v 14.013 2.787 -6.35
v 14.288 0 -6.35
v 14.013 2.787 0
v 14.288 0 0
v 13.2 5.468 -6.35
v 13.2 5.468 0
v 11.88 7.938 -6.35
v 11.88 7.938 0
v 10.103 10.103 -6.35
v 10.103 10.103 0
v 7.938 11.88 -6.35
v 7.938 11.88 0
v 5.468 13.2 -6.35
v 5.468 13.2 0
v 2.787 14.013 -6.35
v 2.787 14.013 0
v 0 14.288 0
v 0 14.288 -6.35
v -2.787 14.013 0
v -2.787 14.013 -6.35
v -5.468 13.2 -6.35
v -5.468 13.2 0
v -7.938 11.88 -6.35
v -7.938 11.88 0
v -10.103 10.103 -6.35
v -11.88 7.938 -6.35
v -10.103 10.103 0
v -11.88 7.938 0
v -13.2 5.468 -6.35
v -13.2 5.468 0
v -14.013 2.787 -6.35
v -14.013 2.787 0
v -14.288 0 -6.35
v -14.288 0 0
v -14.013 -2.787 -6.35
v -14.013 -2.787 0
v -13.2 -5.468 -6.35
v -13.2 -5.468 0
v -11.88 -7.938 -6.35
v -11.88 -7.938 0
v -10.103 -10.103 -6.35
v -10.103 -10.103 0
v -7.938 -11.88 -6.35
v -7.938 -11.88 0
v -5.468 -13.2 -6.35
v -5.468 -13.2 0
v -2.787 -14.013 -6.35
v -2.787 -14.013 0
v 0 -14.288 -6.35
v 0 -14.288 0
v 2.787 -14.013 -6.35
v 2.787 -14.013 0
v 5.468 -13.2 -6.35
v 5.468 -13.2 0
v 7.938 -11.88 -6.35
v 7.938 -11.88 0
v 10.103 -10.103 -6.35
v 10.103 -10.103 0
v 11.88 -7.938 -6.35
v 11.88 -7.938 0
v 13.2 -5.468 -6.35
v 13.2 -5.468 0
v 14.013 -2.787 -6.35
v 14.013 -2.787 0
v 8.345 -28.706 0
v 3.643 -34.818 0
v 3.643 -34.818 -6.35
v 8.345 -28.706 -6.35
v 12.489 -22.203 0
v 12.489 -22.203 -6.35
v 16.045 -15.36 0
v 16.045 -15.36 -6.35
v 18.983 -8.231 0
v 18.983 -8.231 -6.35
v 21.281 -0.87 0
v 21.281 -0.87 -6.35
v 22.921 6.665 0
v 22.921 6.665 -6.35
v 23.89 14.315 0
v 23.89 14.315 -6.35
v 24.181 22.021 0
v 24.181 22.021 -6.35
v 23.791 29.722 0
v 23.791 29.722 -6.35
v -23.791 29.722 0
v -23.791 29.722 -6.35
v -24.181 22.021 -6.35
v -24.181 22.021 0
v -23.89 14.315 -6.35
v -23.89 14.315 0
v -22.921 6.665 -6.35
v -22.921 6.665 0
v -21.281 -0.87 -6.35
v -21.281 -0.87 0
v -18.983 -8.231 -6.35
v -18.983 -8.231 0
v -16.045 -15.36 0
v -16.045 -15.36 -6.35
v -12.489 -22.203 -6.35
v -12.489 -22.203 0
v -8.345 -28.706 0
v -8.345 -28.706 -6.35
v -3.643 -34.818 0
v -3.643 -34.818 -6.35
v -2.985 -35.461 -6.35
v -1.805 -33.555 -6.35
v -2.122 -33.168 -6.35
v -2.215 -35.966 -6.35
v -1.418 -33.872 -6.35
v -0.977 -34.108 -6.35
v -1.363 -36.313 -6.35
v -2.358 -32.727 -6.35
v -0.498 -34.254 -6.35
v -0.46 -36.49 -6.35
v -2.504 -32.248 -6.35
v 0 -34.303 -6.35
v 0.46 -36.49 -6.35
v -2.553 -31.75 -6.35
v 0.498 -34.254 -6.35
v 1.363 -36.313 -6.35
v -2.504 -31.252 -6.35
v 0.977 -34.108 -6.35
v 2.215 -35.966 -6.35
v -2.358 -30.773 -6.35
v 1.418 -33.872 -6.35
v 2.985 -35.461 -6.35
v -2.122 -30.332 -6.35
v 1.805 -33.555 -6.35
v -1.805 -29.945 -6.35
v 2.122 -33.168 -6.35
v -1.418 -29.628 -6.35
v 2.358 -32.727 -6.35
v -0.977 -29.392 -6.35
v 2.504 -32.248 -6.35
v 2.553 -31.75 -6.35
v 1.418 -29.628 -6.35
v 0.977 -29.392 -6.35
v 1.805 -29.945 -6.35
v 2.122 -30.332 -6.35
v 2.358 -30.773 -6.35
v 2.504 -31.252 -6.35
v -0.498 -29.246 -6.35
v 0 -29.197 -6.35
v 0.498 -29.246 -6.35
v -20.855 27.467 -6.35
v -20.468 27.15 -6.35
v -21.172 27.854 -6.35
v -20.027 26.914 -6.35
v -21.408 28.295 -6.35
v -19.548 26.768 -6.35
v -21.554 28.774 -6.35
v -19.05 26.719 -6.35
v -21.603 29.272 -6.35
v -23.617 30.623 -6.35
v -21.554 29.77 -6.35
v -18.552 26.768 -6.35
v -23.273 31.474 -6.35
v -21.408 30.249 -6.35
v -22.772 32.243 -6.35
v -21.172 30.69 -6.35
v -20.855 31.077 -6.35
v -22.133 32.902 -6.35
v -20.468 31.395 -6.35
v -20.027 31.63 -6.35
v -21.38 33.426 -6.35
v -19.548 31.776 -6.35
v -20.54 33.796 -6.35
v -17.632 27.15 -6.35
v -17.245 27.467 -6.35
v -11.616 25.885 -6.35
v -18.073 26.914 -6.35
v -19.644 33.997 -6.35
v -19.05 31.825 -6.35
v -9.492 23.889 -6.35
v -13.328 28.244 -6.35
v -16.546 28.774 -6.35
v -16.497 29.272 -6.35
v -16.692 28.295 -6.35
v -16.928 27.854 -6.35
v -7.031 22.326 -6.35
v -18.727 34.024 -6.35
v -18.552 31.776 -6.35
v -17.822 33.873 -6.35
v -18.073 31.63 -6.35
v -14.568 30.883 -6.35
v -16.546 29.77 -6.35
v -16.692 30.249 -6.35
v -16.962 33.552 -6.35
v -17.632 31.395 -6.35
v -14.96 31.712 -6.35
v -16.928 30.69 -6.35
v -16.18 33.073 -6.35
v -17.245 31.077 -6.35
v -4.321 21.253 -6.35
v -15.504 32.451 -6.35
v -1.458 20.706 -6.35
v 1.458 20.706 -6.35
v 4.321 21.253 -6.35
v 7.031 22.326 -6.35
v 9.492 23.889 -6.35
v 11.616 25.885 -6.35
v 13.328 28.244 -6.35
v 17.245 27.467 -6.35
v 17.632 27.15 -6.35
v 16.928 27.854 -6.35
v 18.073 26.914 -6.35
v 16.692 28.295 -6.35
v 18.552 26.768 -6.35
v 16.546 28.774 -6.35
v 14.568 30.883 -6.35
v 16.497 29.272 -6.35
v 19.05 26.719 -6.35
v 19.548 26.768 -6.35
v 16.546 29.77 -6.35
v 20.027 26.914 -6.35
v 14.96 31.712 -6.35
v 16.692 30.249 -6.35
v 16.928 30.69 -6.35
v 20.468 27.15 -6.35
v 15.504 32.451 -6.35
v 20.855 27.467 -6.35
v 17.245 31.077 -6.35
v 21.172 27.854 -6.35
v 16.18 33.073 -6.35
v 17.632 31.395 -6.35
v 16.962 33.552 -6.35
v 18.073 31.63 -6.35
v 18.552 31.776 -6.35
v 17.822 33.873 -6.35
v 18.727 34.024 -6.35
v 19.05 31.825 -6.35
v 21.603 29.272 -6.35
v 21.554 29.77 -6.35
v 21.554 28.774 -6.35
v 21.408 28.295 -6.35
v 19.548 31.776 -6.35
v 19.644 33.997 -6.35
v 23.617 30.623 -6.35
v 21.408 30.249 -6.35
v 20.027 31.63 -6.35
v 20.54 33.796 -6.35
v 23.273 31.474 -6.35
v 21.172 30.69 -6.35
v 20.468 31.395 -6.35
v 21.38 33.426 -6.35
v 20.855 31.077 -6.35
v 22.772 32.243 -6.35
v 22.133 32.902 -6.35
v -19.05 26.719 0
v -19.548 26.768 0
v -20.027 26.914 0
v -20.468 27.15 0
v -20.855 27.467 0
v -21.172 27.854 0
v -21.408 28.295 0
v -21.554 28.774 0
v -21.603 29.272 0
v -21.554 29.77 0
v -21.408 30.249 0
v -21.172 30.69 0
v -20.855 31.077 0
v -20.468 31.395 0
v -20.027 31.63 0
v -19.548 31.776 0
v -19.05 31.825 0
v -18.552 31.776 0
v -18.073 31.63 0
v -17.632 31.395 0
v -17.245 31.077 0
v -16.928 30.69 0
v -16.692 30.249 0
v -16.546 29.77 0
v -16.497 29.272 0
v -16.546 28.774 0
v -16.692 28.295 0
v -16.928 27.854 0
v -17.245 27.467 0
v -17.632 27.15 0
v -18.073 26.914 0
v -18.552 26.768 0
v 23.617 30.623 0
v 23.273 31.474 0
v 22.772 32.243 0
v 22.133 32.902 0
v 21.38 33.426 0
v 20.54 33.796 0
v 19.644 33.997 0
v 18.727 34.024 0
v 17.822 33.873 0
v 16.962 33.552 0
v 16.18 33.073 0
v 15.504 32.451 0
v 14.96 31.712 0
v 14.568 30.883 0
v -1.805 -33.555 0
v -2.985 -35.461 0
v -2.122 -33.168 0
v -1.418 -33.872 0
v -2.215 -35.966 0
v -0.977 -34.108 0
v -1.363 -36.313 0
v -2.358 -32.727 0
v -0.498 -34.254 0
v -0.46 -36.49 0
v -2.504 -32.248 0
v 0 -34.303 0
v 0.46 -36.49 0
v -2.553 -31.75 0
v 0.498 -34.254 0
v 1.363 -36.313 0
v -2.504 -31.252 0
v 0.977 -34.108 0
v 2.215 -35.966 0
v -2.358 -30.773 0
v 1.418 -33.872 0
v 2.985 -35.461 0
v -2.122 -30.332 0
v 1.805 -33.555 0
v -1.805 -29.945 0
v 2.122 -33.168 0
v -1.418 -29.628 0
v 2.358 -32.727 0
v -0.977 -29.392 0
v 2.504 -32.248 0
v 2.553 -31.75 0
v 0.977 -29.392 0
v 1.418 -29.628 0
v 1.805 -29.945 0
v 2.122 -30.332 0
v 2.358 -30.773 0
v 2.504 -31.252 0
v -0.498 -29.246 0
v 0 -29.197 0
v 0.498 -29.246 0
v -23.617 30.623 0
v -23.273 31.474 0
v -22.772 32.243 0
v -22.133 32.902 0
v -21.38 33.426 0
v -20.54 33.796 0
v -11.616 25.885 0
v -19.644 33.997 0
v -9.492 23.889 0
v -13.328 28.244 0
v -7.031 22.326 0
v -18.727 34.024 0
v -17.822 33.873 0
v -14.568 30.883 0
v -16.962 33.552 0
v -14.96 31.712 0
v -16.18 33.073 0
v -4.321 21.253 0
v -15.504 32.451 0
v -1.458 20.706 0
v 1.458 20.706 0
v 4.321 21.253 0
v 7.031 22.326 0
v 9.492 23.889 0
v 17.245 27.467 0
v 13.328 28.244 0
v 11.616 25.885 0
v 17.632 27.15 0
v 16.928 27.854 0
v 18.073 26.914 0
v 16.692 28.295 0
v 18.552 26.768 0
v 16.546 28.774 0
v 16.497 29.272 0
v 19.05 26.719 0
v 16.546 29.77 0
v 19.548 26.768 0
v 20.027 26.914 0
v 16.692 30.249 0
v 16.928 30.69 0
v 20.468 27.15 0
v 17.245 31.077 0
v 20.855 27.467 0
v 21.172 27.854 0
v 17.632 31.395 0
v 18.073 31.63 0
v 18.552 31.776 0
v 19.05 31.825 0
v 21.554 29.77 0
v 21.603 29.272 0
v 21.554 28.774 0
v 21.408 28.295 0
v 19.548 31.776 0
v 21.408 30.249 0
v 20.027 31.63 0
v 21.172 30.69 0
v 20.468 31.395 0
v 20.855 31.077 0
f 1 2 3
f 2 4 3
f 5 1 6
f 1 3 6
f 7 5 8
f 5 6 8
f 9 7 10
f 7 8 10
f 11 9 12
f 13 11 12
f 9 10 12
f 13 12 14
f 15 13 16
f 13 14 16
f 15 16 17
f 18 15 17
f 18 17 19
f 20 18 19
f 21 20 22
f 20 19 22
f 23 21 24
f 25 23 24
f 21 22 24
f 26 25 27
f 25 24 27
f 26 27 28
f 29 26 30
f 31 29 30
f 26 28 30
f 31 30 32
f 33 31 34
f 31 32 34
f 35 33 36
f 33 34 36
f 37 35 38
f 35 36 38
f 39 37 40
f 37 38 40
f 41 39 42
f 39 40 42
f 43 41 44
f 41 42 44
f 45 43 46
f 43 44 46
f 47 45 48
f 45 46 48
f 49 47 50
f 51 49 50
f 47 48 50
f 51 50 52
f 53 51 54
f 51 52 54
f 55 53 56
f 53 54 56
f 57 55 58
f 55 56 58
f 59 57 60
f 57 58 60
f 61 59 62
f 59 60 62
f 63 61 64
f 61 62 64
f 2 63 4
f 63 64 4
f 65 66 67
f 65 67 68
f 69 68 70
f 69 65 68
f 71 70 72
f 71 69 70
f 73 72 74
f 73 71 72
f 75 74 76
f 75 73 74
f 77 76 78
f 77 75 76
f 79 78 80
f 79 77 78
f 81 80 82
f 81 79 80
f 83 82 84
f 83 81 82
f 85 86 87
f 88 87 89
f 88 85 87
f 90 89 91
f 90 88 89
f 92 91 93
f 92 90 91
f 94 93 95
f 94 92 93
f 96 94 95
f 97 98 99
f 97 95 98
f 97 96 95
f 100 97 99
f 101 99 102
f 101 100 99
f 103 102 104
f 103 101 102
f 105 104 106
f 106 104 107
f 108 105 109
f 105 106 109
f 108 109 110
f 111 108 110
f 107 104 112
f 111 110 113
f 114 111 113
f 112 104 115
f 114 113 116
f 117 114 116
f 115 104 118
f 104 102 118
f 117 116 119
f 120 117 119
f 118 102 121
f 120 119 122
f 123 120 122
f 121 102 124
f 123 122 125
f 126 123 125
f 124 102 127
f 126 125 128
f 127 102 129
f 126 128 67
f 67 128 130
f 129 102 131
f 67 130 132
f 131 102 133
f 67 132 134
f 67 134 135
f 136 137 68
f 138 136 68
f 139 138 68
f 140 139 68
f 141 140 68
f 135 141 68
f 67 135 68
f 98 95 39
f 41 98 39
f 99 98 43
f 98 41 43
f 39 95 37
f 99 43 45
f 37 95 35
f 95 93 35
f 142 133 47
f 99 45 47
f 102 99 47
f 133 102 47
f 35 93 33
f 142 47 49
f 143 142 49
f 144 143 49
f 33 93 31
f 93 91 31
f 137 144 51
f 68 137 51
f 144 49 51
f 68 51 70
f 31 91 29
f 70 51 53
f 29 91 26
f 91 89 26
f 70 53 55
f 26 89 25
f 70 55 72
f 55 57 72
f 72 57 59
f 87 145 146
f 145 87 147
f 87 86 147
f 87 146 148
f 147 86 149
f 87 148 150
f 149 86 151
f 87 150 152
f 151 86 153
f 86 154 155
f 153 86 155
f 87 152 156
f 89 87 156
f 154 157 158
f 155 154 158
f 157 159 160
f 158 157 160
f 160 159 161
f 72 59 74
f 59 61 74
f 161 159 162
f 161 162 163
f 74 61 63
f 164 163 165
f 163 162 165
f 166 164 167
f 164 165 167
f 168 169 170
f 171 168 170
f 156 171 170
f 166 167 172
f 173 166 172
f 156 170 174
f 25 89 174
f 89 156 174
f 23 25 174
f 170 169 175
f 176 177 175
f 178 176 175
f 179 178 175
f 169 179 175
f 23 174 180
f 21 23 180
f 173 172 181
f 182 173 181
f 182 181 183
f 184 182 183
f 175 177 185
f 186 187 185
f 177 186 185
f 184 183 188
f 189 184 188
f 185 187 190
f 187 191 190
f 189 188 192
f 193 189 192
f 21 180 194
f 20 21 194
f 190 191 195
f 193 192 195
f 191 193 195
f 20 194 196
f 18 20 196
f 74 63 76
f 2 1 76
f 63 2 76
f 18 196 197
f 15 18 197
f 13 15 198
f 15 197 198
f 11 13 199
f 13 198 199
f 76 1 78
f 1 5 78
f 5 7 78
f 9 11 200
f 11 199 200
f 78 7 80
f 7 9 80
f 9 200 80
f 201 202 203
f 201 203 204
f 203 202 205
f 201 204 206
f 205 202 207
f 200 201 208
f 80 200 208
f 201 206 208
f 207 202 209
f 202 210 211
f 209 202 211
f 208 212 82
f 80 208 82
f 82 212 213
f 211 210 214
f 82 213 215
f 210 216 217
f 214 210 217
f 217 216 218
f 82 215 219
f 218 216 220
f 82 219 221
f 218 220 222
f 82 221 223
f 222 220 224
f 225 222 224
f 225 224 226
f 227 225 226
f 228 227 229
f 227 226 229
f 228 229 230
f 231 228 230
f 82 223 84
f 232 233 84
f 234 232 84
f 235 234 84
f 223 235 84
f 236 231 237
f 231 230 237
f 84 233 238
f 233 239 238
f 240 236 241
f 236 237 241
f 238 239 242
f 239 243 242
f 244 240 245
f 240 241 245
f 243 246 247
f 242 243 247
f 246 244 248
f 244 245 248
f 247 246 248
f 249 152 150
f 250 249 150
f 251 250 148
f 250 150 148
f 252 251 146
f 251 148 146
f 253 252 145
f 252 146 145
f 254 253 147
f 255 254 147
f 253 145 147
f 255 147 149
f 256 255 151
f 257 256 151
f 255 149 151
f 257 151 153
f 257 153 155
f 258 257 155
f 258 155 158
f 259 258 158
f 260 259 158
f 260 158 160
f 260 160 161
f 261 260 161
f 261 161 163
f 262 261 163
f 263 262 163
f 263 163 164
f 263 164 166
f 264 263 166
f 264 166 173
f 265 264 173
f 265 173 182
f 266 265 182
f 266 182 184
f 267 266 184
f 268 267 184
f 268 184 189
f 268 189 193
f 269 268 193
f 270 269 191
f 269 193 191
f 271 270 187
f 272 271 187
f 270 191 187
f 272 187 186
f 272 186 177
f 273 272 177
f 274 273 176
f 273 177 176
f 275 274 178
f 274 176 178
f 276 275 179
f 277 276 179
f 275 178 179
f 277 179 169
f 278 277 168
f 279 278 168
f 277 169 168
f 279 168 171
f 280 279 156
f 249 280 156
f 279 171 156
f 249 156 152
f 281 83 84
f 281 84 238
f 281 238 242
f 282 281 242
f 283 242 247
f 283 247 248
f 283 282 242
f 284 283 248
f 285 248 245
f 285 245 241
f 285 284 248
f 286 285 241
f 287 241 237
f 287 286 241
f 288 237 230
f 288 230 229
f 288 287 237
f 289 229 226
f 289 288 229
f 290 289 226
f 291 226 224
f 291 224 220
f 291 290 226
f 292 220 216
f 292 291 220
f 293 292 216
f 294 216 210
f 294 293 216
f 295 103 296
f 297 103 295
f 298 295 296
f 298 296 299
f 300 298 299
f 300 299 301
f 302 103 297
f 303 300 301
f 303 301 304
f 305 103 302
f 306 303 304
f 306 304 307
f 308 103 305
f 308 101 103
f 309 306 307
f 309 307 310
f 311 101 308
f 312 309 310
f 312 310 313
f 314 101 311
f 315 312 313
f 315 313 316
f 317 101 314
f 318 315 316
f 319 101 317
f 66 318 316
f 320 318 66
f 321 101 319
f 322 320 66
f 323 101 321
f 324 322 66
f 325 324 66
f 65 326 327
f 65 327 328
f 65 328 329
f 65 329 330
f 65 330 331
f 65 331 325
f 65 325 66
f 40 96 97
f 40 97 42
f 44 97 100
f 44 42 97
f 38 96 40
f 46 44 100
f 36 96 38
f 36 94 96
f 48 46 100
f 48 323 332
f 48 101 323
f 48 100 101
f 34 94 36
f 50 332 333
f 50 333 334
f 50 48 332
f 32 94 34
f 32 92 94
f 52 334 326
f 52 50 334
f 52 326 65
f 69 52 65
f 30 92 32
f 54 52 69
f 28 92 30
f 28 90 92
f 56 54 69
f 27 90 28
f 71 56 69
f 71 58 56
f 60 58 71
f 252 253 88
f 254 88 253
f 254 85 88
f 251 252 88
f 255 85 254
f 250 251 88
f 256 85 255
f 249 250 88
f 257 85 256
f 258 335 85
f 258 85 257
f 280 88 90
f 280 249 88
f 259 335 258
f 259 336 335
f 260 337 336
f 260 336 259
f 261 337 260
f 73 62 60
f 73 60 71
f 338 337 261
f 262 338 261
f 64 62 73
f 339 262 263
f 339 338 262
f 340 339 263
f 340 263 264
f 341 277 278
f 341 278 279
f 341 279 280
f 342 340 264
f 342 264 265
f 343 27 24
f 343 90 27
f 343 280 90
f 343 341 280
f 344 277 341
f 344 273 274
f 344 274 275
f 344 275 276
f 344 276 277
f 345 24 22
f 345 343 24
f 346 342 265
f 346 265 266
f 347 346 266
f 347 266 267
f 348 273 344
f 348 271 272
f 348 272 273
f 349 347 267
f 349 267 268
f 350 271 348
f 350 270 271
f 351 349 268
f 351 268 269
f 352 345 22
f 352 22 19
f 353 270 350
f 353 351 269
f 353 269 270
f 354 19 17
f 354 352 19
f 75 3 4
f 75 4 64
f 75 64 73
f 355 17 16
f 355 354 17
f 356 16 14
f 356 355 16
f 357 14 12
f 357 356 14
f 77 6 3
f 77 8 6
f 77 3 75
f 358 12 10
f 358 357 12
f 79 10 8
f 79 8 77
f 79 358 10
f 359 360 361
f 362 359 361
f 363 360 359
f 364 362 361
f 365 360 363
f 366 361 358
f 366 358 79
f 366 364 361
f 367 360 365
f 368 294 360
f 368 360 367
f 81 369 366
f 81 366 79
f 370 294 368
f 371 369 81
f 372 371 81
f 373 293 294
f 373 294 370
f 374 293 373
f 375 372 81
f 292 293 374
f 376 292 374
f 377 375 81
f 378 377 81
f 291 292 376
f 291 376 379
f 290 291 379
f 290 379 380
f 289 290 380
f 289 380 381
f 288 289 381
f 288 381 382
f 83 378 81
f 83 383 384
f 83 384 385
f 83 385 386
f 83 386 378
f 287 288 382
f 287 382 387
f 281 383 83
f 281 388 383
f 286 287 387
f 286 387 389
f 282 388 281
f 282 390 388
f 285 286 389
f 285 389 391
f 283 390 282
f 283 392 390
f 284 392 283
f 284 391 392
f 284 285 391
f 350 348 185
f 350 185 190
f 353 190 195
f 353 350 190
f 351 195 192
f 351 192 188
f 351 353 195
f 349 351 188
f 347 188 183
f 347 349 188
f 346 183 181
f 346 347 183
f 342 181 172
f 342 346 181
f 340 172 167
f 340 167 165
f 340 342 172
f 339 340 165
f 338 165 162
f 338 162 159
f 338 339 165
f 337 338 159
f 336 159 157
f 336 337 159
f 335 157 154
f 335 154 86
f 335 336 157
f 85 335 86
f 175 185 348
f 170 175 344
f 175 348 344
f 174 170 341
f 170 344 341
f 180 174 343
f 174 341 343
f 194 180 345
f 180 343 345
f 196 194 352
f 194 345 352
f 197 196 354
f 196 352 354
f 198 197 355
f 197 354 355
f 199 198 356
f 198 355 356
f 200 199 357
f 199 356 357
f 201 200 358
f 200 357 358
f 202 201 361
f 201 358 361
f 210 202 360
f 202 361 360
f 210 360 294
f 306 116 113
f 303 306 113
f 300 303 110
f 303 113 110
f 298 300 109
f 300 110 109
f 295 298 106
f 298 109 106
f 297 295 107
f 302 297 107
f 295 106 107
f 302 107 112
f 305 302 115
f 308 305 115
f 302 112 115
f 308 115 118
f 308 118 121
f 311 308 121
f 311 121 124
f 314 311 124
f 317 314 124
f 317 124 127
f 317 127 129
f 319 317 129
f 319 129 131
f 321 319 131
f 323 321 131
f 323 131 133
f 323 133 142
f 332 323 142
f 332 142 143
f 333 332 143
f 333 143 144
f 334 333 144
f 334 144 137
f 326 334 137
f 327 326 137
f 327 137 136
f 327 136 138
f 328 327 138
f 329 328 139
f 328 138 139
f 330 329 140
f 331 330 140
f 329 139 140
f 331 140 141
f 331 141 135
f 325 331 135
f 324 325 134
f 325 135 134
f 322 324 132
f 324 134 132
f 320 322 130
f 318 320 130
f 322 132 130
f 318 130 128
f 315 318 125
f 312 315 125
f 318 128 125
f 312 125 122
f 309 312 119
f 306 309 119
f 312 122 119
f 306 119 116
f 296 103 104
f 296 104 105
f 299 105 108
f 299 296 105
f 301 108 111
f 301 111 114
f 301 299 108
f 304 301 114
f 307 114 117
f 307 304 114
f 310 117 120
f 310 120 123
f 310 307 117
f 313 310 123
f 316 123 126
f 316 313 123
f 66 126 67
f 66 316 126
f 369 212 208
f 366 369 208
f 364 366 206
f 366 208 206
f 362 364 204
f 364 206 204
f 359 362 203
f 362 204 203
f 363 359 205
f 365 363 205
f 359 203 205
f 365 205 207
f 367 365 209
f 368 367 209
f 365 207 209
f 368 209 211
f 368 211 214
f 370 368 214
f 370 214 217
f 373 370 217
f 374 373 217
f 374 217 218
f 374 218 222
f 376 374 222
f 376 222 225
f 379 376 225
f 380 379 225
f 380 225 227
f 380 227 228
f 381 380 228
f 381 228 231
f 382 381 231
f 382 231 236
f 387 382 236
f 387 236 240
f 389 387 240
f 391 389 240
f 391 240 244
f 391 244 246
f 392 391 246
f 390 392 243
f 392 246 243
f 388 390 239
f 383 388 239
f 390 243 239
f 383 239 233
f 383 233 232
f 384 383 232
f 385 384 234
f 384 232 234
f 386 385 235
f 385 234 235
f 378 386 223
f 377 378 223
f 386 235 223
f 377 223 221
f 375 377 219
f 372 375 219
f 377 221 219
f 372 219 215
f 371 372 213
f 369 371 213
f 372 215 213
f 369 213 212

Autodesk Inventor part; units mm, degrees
ref_plane "YZ Plane" through (0, 0, 0) normal (1, 0, 0) x (0, 1, 0)
ref_plane "XZ Plane" through (0, 0, 0) normal (0, 1, 0) x (-1, 0, 0)
ref_plane "XY Plane" through (0, 0, 0) normal (0, 0, 1) x (1, 0, 0)
sketch "Sketch1" plane through (0, 0, 0) normal (0, 0, 1) x (1, 0, 0)
  circle A0 centre (0, 0) radius 14.2875
  circle A1 centre (0, 0) radius 20.6375
  circle A2 centre (0, -31.75) radius 4.7625
  circle A3 centre (-19.05, 29.2721) radius 4.7625
  circle A4 centre (19.05, 29.2721) radius 4.7625
  arc A5 (-23.7912, 29.7223) -> (-3.6429, -34.8176) centre (63.1904, 21.4615) ccw
  arc A6 (3.6429, -34.8176) -> (23.7912, 29.7223) centre (-63.1904, 21.4615) ccw
  arc A7 (-14.5681, 30.8826) -> (14.5681, 30.8826) centre (0, 36.1176) ccw
  dimension "d0" = 28.575
  dimension "d1" = 6.35
  dimension "d2" = 9.525
  dimension "d3" = 9.525
  dimension "d4" = 9.525
  dimension "d7" = 6.35
  dimension "d8" = 9.525
  dimension "d9" = 9.525
  dimension "d13" = 19.05
extrude "Extrusion1" add sketch "Sketch1" against normal blind 6.35
hole "Hole1" at (0, 0, 0) at (-19.05, 29.2721, 0) at (19.05, 29.2721, 0) at (0, -31.75, 0) direction (0, 0, -1) diameter 5.1054 end through all clearance for "Flat Head Machine Screw (82)" size "#10" standard "Ansi Unified Screw Threads"
properties part number "GP5-027" material "Aluminum 6061"
